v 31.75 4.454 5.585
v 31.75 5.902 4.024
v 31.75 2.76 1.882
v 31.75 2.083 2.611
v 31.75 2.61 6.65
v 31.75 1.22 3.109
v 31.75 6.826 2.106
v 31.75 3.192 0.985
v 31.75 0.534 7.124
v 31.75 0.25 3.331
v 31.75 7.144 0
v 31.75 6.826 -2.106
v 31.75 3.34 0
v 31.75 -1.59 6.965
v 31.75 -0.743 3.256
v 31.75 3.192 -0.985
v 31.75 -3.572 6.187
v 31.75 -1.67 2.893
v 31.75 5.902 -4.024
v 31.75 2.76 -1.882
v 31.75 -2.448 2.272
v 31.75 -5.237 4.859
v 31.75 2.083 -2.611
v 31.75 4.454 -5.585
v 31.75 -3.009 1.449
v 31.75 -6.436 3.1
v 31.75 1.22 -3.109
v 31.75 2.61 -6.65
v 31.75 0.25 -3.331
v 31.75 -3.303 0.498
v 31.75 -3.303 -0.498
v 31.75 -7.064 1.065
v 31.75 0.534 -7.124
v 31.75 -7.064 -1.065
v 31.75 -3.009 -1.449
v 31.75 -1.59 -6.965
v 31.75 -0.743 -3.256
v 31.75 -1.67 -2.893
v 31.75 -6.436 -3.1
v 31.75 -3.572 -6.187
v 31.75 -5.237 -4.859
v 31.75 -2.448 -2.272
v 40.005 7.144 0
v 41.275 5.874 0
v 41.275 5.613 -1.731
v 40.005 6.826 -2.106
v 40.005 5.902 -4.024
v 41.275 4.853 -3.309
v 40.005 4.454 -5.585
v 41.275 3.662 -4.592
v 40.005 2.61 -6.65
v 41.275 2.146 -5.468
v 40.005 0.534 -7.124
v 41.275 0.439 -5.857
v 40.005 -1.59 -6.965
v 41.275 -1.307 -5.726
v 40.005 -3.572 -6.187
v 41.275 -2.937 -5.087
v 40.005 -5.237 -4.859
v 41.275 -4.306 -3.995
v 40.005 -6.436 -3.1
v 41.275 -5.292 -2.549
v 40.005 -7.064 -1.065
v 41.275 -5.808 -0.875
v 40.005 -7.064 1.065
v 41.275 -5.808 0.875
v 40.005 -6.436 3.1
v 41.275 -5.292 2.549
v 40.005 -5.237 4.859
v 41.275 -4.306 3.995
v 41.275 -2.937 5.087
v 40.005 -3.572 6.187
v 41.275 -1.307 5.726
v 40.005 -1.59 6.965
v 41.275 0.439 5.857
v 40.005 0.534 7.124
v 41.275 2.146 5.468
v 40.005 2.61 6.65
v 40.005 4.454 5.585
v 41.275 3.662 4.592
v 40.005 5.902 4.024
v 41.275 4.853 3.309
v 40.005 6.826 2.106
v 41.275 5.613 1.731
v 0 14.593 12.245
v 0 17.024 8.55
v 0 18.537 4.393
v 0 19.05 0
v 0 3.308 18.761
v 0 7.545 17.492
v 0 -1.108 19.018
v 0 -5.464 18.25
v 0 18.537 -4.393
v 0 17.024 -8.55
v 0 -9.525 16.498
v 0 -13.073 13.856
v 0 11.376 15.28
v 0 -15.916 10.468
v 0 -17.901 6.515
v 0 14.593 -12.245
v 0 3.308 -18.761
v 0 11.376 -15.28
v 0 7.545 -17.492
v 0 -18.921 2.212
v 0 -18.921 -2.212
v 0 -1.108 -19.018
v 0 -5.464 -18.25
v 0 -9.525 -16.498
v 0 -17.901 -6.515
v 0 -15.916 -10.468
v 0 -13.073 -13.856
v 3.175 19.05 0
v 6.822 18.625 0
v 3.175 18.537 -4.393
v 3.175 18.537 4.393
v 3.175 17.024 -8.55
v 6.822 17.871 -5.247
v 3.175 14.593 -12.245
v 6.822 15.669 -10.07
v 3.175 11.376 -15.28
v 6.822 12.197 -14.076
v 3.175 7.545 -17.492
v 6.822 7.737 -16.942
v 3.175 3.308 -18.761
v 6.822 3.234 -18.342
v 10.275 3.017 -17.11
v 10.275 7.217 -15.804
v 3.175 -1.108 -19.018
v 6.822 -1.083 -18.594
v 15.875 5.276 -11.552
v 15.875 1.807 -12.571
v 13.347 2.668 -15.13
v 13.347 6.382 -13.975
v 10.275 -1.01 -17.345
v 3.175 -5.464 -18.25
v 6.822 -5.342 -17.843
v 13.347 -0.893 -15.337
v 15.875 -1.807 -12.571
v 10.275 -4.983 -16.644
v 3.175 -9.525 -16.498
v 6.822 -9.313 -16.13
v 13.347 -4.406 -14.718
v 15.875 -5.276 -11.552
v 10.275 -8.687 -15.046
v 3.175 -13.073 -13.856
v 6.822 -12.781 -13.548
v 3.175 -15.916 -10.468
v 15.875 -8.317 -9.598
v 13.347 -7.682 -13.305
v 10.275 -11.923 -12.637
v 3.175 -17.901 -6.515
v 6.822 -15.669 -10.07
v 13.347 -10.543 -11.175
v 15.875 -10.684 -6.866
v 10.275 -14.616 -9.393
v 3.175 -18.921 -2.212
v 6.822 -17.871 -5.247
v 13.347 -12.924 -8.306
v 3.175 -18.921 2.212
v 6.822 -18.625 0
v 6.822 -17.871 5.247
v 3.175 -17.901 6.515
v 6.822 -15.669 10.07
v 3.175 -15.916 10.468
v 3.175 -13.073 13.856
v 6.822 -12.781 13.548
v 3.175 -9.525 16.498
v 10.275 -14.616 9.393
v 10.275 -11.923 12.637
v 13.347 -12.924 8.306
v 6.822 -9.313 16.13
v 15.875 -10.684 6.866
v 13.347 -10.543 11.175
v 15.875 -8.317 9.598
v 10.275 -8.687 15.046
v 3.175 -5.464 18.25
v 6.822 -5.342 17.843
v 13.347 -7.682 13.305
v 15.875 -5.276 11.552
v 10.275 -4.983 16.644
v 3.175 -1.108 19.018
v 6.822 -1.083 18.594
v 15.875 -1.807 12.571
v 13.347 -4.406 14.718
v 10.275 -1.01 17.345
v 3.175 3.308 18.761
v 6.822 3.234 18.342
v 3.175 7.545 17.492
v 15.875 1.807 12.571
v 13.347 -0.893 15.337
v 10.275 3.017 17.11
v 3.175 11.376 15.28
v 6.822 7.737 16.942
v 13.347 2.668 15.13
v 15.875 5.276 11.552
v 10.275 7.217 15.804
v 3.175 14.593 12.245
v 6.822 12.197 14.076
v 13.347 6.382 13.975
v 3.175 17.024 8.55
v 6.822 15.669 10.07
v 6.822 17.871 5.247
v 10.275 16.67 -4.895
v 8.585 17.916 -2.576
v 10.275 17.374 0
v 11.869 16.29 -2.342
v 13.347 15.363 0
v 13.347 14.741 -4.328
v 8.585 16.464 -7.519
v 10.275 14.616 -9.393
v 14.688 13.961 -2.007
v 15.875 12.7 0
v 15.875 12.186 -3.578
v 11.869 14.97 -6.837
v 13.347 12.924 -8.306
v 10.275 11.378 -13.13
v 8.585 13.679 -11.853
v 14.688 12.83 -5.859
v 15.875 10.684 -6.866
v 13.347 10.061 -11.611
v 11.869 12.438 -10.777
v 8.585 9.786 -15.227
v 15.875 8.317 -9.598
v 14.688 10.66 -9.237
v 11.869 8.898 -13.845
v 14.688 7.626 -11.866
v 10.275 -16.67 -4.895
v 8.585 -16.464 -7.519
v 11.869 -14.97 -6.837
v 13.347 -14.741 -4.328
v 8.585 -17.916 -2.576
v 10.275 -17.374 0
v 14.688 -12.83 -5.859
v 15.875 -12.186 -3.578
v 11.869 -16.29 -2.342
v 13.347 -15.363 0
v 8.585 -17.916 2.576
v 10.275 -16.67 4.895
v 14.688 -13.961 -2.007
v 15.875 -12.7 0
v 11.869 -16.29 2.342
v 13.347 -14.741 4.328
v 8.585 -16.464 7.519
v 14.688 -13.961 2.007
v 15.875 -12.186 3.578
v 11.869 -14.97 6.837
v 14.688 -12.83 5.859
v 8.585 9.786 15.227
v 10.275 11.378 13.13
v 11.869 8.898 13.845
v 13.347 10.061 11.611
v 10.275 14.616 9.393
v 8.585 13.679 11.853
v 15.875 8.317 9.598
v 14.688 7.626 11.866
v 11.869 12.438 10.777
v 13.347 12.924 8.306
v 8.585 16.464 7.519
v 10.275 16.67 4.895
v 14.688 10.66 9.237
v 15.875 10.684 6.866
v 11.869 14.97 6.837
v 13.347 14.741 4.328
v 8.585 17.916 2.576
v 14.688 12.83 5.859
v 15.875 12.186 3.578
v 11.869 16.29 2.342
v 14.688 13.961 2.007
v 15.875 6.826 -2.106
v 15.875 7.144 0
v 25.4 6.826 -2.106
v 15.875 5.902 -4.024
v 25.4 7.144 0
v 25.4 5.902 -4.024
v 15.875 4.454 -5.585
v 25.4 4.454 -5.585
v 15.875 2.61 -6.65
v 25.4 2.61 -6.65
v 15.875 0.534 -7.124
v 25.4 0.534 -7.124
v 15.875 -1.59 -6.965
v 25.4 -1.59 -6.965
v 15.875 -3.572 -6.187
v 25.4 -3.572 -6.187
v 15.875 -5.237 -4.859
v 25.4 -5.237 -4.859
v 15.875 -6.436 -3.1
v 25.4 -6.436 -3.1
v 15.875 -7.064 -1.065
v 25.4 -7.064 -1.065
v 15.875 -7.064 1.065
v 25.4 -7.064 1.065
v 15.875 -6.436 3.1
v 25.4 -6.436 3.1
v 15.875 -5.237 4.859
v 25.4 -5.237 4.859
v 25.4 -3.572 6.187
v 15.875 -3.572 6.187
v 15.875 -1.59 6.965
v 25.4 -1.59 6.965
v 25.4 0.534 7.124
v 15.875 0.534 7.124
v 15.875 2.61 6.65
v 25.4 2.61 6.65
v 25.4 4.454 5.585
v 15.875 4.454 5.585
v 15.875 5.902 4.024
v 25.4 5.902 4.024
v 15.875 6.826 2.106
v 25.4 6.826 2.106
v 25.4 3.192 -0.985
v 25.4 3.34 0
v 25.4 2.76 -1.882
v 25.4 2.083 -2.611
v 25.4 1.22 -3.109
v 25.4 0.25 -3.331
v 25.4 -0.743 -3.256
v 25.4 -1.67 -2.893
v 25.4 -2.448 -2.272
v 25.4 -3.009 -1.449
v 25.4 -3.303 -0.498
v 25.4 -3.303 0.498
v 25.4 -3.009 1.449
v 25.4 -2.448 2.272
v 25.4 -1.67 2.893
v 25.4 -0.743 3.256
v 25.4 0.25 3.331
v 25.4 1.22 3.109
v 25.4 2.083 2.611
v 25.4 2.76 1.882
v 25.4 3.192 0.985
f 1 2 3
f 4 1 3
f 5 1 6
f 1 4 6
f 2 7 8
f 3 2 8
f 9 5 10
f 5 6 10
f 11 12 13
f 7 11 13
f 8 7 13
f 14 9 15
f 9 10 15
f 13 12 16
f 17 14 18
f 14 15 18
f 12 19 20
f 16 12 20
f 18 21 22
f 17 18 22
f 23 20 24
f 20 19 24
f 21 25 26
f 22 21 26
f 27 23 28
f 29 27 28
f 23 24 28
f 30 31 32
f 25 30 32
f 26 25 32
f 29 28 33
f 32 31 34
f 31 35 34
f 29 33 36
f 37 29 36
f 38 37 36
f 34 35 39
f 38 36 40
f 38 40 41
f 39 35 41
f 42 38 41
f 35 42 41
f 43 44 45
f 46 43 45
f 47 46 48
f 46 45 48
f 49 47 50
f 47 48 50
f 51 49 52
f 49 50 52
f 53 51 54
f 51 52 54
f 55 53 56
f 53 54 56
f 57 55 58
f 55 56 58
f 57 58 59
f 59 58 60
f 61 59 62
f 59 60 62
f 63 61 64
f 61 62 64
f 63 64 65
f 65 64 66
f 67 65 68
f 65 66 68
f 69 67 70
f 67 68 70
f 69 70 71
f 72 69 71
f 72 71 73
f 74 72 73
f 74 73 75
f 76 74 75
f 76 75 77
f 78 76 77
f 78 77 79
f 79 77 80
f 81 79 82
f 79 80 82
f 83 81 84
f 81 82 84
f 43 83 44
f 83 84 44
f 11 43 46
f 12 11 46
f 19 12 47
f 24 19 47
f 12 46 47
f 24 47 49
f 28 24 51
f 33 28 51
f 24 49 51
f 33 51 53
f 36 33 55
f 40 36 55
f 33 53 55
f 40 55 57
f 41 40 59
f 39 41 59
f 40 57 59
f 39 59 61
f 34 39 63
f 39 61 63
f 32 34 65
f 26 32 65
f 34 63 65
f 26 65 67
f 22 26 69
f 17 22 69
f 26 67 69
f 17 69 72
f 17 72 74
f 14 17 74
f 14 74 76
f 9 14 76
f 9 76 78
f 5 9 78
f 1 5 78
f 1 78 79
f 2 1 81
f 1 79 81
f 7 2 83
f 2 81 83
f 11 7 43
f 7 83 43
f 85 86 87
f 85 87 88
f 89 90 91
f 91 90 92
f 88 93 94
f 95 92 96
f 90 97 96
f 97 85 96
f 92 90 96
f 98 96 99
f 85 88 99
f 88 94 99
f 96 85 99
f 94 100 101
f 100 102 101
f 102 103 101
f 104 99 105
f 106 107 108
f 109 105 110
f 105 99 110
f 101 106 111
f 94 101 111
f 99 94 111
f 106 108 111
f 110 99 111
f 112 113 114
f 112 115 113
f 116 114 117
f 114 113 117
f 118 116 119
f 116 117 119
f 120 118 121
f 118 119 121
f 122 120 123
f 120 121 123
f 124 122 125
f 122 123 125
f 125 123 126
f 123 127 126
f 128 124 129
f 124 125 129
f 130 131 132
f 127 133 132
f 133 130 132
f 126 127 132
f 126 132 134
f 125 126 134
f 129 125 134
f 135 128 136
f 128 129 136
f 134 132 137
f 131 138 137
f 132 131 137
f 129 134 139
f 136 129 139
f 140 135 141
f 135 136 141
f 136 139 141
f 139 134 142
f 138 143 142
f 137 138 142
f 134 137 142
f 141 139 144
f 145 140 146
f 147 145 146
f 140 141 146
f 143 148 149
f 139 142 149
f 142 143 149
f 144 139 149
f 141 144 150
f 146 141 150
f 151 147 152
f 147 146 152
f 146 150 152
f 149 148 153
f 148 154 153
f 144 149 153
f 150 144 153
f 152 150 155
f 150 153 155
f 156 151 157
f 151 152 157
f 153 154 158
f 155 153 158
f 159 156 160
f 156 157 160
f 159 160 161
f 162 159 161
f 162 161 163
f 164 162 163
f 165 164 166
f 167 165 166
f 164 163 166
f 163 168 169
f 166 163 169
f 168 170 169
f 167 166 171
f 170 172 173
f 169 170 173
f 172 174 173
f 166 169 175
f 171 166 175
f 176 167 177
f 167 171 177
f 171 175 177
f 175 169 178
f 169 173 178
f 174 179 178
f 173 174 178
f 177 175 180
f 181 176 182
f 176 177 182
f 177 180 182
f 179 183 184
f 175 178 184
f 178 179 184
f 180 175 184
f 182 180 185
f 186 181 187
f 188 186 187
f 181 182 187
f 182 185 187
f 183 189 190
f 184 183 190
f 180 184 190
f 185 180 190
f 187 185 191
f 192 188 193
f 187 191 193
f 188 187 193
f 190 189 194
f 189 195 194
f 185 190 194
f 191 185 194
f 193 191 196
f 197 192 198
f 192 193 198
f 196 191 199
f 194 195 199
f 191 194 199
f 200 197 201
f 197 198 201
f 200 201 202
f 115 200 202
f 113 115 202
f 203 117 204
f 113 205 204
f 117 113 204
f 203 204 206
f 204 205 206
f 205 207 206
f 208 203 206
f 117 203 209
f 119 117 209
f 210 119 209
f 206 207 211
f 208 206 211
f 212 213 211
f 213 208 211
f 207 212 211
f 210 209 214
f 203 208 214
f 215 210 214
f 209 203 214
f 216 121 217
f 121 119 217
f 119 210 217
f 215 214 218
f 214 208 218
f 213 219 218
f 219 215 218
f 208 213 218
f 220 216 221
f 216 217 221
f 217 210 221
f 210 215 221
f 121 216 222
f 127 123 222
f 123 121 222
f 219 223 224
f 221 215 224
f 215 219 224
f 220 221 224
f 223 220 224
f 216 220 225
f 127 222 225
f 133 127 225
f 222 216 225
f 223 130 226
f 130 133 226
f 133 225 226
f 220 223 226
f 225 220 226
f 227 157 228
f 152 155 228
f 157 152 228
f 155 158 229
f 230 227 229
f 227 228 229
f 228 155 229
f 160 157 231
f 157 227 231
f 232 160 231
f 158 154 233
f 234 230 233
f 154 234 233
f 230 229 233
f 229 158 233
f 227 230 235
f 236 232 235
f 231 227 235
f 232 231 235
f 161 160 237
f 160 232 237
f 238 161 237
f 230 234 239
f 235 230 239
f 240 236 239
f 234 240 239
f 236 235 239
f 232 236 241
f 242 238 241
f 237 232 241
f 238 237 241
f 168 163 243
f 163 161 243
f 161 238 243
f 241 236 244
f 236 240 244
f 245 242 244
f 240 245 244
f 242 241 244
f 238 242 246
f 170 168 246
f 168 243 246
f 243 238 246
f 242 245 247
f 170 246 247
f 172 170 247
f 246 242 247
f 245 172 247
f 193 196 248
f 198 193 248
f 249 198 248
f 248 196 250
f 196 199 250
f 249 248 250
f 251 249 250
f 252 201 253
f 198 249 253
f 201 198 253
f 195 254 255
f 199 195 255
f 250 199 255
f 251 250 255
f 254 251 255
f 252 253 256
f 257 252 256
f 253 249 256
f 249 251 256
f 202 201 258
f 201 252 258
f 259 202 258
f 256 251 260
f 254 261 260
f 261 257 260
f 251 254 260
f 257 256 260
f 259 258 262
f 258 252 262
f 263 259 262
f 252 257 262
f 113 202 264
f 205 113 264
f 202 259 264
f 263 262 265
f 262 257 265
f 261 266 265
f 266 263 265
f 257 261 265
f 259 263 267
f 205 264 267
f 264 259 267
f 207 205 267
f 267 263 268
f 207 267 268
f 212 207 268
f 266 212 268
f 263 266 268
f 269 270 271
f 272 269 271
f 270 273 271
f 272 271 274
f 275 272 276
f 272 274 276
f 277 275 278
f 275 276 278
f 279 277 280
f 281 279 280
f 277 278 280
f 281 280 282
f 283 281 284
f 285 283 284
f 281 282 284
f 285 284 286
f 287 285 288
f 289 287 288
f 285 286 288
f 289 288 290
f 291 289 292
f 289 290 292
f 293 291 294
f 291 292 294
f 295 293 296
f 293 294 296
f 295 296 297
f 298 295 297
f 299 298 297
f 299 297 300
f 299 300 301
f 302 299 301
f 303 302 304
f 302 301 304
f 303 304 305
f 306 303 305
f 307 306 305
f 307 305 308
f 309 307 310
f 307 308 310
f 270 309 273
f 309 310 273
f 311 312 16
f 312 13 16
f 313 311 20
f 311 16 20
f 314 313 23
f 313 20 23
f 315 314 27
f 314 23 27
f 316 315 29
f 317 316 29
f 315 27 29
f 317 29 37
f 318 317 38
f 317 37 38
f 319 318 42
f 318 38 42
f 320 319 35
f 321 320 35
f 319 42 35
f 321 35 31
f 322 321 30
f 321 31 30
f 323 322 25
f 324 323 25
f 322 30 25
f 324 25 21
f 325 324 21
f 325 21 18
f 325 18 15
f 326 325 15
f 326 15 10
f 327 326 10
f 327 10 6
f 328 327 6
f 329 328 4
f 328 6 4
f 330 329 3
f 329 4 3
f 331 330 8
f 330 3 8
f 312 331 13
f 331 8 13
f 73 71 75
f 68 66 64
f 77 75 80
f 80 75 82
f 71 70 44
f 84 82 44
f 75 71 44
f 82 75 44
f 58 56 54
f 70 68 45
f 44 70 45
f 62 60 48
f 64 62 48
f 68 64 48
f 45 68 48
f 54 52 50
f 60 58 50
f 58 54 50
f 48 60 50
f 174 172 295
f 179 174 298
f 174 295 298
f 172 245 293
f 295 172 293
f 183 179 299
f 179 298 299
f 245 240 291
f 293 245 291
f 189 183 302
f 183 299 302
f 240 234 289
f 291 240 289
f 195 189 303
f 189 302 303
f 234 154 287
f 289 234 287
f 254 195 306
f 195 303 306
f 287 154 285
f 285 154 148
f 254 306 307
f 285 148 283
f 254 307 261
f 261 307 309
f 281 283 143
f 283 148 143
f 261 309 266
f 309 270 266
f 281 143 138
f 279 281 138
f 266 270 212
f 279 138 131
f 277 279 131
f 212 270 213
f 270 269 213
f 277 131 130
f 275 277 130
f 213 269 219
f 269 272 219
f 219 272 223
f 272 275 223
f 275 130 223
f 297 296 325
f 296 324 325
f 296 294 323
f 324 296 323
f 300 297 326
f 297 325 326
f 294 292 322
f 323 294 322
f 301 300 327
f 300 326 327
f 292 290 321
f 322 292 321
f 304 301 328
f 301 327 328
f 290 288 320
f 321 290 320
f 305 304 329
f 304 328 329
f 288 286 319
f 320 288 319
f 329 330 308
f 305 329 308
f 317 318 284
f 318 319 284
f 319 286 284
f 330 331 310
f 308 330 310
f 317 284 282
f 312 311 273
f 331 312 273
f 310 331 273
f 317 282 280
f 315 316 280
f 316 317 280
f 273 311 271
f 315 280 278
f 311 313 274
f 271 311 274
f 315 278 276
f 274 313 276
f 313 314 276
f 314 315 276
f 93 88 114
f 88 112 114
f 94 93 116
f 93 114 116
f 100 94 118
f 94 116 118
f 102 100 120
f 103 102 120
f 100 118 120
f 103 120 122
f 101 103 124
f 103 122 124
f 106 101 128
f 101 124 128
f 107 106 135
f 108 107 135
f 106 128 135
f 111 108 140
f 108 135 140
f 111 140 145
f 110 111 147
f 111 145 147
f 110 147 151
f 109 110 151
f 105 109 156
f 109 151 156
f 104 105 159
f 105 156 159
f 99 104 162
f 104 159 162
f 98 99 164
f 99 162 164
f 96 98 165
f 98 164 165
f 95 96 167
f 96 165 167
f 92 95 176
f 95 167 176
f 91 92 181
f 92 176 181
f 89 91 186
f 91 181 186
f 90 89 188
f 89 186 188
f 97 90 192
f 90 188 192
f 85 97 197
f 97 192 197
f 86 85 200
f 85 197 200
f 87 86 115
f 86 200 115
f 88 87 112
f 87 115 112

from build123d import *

# Parameters (mm, degrees)
CHAMFER1_SIZE = 1.27


with BuildPart() as part:
    # Sketch1 → Revolve1 (revolve)
    with BuildSketch(Plane.XY):
        with BuildLine():
            Line((0, 0), (0, 19.05))
            Line((0, 19.05), (3.175, 19.05))
            ThreePointArc((3.175, 19.05), (10.274515829, 17.374031657), (15.875, 12.7))
            Line((15.875, 12.7), (15.875, 7.14375))
            Line((15.875, 7.14375), (25.4, 7.14375))
            Line((25.4, 7.14375), (25.4, 3.3401))
            Line((25.4, 3.3401), (31.75, 3.3401))
            Line((31.75, 3.3401), (31.75, 7.14375))
            Line((31.75, 7.14375), (41.275, 7.14375))
            Line((41.275, 7.14375), (41.275, 0))
            Line((41.275, 0), (0, 0))
        make_face()
    revolve(axis=Axis((41.275, 0, 0), (-1, 0, 0)))

    # Chamfer1
    chamfer1_edges = [part.edges().sort_by_distance(p)[0] for p in [
        (41.275, -7.14375, 0),
    ]]
    chamfer(chamfer1_edges, length=CHAMFER1_SIZE)


solid = part.part
